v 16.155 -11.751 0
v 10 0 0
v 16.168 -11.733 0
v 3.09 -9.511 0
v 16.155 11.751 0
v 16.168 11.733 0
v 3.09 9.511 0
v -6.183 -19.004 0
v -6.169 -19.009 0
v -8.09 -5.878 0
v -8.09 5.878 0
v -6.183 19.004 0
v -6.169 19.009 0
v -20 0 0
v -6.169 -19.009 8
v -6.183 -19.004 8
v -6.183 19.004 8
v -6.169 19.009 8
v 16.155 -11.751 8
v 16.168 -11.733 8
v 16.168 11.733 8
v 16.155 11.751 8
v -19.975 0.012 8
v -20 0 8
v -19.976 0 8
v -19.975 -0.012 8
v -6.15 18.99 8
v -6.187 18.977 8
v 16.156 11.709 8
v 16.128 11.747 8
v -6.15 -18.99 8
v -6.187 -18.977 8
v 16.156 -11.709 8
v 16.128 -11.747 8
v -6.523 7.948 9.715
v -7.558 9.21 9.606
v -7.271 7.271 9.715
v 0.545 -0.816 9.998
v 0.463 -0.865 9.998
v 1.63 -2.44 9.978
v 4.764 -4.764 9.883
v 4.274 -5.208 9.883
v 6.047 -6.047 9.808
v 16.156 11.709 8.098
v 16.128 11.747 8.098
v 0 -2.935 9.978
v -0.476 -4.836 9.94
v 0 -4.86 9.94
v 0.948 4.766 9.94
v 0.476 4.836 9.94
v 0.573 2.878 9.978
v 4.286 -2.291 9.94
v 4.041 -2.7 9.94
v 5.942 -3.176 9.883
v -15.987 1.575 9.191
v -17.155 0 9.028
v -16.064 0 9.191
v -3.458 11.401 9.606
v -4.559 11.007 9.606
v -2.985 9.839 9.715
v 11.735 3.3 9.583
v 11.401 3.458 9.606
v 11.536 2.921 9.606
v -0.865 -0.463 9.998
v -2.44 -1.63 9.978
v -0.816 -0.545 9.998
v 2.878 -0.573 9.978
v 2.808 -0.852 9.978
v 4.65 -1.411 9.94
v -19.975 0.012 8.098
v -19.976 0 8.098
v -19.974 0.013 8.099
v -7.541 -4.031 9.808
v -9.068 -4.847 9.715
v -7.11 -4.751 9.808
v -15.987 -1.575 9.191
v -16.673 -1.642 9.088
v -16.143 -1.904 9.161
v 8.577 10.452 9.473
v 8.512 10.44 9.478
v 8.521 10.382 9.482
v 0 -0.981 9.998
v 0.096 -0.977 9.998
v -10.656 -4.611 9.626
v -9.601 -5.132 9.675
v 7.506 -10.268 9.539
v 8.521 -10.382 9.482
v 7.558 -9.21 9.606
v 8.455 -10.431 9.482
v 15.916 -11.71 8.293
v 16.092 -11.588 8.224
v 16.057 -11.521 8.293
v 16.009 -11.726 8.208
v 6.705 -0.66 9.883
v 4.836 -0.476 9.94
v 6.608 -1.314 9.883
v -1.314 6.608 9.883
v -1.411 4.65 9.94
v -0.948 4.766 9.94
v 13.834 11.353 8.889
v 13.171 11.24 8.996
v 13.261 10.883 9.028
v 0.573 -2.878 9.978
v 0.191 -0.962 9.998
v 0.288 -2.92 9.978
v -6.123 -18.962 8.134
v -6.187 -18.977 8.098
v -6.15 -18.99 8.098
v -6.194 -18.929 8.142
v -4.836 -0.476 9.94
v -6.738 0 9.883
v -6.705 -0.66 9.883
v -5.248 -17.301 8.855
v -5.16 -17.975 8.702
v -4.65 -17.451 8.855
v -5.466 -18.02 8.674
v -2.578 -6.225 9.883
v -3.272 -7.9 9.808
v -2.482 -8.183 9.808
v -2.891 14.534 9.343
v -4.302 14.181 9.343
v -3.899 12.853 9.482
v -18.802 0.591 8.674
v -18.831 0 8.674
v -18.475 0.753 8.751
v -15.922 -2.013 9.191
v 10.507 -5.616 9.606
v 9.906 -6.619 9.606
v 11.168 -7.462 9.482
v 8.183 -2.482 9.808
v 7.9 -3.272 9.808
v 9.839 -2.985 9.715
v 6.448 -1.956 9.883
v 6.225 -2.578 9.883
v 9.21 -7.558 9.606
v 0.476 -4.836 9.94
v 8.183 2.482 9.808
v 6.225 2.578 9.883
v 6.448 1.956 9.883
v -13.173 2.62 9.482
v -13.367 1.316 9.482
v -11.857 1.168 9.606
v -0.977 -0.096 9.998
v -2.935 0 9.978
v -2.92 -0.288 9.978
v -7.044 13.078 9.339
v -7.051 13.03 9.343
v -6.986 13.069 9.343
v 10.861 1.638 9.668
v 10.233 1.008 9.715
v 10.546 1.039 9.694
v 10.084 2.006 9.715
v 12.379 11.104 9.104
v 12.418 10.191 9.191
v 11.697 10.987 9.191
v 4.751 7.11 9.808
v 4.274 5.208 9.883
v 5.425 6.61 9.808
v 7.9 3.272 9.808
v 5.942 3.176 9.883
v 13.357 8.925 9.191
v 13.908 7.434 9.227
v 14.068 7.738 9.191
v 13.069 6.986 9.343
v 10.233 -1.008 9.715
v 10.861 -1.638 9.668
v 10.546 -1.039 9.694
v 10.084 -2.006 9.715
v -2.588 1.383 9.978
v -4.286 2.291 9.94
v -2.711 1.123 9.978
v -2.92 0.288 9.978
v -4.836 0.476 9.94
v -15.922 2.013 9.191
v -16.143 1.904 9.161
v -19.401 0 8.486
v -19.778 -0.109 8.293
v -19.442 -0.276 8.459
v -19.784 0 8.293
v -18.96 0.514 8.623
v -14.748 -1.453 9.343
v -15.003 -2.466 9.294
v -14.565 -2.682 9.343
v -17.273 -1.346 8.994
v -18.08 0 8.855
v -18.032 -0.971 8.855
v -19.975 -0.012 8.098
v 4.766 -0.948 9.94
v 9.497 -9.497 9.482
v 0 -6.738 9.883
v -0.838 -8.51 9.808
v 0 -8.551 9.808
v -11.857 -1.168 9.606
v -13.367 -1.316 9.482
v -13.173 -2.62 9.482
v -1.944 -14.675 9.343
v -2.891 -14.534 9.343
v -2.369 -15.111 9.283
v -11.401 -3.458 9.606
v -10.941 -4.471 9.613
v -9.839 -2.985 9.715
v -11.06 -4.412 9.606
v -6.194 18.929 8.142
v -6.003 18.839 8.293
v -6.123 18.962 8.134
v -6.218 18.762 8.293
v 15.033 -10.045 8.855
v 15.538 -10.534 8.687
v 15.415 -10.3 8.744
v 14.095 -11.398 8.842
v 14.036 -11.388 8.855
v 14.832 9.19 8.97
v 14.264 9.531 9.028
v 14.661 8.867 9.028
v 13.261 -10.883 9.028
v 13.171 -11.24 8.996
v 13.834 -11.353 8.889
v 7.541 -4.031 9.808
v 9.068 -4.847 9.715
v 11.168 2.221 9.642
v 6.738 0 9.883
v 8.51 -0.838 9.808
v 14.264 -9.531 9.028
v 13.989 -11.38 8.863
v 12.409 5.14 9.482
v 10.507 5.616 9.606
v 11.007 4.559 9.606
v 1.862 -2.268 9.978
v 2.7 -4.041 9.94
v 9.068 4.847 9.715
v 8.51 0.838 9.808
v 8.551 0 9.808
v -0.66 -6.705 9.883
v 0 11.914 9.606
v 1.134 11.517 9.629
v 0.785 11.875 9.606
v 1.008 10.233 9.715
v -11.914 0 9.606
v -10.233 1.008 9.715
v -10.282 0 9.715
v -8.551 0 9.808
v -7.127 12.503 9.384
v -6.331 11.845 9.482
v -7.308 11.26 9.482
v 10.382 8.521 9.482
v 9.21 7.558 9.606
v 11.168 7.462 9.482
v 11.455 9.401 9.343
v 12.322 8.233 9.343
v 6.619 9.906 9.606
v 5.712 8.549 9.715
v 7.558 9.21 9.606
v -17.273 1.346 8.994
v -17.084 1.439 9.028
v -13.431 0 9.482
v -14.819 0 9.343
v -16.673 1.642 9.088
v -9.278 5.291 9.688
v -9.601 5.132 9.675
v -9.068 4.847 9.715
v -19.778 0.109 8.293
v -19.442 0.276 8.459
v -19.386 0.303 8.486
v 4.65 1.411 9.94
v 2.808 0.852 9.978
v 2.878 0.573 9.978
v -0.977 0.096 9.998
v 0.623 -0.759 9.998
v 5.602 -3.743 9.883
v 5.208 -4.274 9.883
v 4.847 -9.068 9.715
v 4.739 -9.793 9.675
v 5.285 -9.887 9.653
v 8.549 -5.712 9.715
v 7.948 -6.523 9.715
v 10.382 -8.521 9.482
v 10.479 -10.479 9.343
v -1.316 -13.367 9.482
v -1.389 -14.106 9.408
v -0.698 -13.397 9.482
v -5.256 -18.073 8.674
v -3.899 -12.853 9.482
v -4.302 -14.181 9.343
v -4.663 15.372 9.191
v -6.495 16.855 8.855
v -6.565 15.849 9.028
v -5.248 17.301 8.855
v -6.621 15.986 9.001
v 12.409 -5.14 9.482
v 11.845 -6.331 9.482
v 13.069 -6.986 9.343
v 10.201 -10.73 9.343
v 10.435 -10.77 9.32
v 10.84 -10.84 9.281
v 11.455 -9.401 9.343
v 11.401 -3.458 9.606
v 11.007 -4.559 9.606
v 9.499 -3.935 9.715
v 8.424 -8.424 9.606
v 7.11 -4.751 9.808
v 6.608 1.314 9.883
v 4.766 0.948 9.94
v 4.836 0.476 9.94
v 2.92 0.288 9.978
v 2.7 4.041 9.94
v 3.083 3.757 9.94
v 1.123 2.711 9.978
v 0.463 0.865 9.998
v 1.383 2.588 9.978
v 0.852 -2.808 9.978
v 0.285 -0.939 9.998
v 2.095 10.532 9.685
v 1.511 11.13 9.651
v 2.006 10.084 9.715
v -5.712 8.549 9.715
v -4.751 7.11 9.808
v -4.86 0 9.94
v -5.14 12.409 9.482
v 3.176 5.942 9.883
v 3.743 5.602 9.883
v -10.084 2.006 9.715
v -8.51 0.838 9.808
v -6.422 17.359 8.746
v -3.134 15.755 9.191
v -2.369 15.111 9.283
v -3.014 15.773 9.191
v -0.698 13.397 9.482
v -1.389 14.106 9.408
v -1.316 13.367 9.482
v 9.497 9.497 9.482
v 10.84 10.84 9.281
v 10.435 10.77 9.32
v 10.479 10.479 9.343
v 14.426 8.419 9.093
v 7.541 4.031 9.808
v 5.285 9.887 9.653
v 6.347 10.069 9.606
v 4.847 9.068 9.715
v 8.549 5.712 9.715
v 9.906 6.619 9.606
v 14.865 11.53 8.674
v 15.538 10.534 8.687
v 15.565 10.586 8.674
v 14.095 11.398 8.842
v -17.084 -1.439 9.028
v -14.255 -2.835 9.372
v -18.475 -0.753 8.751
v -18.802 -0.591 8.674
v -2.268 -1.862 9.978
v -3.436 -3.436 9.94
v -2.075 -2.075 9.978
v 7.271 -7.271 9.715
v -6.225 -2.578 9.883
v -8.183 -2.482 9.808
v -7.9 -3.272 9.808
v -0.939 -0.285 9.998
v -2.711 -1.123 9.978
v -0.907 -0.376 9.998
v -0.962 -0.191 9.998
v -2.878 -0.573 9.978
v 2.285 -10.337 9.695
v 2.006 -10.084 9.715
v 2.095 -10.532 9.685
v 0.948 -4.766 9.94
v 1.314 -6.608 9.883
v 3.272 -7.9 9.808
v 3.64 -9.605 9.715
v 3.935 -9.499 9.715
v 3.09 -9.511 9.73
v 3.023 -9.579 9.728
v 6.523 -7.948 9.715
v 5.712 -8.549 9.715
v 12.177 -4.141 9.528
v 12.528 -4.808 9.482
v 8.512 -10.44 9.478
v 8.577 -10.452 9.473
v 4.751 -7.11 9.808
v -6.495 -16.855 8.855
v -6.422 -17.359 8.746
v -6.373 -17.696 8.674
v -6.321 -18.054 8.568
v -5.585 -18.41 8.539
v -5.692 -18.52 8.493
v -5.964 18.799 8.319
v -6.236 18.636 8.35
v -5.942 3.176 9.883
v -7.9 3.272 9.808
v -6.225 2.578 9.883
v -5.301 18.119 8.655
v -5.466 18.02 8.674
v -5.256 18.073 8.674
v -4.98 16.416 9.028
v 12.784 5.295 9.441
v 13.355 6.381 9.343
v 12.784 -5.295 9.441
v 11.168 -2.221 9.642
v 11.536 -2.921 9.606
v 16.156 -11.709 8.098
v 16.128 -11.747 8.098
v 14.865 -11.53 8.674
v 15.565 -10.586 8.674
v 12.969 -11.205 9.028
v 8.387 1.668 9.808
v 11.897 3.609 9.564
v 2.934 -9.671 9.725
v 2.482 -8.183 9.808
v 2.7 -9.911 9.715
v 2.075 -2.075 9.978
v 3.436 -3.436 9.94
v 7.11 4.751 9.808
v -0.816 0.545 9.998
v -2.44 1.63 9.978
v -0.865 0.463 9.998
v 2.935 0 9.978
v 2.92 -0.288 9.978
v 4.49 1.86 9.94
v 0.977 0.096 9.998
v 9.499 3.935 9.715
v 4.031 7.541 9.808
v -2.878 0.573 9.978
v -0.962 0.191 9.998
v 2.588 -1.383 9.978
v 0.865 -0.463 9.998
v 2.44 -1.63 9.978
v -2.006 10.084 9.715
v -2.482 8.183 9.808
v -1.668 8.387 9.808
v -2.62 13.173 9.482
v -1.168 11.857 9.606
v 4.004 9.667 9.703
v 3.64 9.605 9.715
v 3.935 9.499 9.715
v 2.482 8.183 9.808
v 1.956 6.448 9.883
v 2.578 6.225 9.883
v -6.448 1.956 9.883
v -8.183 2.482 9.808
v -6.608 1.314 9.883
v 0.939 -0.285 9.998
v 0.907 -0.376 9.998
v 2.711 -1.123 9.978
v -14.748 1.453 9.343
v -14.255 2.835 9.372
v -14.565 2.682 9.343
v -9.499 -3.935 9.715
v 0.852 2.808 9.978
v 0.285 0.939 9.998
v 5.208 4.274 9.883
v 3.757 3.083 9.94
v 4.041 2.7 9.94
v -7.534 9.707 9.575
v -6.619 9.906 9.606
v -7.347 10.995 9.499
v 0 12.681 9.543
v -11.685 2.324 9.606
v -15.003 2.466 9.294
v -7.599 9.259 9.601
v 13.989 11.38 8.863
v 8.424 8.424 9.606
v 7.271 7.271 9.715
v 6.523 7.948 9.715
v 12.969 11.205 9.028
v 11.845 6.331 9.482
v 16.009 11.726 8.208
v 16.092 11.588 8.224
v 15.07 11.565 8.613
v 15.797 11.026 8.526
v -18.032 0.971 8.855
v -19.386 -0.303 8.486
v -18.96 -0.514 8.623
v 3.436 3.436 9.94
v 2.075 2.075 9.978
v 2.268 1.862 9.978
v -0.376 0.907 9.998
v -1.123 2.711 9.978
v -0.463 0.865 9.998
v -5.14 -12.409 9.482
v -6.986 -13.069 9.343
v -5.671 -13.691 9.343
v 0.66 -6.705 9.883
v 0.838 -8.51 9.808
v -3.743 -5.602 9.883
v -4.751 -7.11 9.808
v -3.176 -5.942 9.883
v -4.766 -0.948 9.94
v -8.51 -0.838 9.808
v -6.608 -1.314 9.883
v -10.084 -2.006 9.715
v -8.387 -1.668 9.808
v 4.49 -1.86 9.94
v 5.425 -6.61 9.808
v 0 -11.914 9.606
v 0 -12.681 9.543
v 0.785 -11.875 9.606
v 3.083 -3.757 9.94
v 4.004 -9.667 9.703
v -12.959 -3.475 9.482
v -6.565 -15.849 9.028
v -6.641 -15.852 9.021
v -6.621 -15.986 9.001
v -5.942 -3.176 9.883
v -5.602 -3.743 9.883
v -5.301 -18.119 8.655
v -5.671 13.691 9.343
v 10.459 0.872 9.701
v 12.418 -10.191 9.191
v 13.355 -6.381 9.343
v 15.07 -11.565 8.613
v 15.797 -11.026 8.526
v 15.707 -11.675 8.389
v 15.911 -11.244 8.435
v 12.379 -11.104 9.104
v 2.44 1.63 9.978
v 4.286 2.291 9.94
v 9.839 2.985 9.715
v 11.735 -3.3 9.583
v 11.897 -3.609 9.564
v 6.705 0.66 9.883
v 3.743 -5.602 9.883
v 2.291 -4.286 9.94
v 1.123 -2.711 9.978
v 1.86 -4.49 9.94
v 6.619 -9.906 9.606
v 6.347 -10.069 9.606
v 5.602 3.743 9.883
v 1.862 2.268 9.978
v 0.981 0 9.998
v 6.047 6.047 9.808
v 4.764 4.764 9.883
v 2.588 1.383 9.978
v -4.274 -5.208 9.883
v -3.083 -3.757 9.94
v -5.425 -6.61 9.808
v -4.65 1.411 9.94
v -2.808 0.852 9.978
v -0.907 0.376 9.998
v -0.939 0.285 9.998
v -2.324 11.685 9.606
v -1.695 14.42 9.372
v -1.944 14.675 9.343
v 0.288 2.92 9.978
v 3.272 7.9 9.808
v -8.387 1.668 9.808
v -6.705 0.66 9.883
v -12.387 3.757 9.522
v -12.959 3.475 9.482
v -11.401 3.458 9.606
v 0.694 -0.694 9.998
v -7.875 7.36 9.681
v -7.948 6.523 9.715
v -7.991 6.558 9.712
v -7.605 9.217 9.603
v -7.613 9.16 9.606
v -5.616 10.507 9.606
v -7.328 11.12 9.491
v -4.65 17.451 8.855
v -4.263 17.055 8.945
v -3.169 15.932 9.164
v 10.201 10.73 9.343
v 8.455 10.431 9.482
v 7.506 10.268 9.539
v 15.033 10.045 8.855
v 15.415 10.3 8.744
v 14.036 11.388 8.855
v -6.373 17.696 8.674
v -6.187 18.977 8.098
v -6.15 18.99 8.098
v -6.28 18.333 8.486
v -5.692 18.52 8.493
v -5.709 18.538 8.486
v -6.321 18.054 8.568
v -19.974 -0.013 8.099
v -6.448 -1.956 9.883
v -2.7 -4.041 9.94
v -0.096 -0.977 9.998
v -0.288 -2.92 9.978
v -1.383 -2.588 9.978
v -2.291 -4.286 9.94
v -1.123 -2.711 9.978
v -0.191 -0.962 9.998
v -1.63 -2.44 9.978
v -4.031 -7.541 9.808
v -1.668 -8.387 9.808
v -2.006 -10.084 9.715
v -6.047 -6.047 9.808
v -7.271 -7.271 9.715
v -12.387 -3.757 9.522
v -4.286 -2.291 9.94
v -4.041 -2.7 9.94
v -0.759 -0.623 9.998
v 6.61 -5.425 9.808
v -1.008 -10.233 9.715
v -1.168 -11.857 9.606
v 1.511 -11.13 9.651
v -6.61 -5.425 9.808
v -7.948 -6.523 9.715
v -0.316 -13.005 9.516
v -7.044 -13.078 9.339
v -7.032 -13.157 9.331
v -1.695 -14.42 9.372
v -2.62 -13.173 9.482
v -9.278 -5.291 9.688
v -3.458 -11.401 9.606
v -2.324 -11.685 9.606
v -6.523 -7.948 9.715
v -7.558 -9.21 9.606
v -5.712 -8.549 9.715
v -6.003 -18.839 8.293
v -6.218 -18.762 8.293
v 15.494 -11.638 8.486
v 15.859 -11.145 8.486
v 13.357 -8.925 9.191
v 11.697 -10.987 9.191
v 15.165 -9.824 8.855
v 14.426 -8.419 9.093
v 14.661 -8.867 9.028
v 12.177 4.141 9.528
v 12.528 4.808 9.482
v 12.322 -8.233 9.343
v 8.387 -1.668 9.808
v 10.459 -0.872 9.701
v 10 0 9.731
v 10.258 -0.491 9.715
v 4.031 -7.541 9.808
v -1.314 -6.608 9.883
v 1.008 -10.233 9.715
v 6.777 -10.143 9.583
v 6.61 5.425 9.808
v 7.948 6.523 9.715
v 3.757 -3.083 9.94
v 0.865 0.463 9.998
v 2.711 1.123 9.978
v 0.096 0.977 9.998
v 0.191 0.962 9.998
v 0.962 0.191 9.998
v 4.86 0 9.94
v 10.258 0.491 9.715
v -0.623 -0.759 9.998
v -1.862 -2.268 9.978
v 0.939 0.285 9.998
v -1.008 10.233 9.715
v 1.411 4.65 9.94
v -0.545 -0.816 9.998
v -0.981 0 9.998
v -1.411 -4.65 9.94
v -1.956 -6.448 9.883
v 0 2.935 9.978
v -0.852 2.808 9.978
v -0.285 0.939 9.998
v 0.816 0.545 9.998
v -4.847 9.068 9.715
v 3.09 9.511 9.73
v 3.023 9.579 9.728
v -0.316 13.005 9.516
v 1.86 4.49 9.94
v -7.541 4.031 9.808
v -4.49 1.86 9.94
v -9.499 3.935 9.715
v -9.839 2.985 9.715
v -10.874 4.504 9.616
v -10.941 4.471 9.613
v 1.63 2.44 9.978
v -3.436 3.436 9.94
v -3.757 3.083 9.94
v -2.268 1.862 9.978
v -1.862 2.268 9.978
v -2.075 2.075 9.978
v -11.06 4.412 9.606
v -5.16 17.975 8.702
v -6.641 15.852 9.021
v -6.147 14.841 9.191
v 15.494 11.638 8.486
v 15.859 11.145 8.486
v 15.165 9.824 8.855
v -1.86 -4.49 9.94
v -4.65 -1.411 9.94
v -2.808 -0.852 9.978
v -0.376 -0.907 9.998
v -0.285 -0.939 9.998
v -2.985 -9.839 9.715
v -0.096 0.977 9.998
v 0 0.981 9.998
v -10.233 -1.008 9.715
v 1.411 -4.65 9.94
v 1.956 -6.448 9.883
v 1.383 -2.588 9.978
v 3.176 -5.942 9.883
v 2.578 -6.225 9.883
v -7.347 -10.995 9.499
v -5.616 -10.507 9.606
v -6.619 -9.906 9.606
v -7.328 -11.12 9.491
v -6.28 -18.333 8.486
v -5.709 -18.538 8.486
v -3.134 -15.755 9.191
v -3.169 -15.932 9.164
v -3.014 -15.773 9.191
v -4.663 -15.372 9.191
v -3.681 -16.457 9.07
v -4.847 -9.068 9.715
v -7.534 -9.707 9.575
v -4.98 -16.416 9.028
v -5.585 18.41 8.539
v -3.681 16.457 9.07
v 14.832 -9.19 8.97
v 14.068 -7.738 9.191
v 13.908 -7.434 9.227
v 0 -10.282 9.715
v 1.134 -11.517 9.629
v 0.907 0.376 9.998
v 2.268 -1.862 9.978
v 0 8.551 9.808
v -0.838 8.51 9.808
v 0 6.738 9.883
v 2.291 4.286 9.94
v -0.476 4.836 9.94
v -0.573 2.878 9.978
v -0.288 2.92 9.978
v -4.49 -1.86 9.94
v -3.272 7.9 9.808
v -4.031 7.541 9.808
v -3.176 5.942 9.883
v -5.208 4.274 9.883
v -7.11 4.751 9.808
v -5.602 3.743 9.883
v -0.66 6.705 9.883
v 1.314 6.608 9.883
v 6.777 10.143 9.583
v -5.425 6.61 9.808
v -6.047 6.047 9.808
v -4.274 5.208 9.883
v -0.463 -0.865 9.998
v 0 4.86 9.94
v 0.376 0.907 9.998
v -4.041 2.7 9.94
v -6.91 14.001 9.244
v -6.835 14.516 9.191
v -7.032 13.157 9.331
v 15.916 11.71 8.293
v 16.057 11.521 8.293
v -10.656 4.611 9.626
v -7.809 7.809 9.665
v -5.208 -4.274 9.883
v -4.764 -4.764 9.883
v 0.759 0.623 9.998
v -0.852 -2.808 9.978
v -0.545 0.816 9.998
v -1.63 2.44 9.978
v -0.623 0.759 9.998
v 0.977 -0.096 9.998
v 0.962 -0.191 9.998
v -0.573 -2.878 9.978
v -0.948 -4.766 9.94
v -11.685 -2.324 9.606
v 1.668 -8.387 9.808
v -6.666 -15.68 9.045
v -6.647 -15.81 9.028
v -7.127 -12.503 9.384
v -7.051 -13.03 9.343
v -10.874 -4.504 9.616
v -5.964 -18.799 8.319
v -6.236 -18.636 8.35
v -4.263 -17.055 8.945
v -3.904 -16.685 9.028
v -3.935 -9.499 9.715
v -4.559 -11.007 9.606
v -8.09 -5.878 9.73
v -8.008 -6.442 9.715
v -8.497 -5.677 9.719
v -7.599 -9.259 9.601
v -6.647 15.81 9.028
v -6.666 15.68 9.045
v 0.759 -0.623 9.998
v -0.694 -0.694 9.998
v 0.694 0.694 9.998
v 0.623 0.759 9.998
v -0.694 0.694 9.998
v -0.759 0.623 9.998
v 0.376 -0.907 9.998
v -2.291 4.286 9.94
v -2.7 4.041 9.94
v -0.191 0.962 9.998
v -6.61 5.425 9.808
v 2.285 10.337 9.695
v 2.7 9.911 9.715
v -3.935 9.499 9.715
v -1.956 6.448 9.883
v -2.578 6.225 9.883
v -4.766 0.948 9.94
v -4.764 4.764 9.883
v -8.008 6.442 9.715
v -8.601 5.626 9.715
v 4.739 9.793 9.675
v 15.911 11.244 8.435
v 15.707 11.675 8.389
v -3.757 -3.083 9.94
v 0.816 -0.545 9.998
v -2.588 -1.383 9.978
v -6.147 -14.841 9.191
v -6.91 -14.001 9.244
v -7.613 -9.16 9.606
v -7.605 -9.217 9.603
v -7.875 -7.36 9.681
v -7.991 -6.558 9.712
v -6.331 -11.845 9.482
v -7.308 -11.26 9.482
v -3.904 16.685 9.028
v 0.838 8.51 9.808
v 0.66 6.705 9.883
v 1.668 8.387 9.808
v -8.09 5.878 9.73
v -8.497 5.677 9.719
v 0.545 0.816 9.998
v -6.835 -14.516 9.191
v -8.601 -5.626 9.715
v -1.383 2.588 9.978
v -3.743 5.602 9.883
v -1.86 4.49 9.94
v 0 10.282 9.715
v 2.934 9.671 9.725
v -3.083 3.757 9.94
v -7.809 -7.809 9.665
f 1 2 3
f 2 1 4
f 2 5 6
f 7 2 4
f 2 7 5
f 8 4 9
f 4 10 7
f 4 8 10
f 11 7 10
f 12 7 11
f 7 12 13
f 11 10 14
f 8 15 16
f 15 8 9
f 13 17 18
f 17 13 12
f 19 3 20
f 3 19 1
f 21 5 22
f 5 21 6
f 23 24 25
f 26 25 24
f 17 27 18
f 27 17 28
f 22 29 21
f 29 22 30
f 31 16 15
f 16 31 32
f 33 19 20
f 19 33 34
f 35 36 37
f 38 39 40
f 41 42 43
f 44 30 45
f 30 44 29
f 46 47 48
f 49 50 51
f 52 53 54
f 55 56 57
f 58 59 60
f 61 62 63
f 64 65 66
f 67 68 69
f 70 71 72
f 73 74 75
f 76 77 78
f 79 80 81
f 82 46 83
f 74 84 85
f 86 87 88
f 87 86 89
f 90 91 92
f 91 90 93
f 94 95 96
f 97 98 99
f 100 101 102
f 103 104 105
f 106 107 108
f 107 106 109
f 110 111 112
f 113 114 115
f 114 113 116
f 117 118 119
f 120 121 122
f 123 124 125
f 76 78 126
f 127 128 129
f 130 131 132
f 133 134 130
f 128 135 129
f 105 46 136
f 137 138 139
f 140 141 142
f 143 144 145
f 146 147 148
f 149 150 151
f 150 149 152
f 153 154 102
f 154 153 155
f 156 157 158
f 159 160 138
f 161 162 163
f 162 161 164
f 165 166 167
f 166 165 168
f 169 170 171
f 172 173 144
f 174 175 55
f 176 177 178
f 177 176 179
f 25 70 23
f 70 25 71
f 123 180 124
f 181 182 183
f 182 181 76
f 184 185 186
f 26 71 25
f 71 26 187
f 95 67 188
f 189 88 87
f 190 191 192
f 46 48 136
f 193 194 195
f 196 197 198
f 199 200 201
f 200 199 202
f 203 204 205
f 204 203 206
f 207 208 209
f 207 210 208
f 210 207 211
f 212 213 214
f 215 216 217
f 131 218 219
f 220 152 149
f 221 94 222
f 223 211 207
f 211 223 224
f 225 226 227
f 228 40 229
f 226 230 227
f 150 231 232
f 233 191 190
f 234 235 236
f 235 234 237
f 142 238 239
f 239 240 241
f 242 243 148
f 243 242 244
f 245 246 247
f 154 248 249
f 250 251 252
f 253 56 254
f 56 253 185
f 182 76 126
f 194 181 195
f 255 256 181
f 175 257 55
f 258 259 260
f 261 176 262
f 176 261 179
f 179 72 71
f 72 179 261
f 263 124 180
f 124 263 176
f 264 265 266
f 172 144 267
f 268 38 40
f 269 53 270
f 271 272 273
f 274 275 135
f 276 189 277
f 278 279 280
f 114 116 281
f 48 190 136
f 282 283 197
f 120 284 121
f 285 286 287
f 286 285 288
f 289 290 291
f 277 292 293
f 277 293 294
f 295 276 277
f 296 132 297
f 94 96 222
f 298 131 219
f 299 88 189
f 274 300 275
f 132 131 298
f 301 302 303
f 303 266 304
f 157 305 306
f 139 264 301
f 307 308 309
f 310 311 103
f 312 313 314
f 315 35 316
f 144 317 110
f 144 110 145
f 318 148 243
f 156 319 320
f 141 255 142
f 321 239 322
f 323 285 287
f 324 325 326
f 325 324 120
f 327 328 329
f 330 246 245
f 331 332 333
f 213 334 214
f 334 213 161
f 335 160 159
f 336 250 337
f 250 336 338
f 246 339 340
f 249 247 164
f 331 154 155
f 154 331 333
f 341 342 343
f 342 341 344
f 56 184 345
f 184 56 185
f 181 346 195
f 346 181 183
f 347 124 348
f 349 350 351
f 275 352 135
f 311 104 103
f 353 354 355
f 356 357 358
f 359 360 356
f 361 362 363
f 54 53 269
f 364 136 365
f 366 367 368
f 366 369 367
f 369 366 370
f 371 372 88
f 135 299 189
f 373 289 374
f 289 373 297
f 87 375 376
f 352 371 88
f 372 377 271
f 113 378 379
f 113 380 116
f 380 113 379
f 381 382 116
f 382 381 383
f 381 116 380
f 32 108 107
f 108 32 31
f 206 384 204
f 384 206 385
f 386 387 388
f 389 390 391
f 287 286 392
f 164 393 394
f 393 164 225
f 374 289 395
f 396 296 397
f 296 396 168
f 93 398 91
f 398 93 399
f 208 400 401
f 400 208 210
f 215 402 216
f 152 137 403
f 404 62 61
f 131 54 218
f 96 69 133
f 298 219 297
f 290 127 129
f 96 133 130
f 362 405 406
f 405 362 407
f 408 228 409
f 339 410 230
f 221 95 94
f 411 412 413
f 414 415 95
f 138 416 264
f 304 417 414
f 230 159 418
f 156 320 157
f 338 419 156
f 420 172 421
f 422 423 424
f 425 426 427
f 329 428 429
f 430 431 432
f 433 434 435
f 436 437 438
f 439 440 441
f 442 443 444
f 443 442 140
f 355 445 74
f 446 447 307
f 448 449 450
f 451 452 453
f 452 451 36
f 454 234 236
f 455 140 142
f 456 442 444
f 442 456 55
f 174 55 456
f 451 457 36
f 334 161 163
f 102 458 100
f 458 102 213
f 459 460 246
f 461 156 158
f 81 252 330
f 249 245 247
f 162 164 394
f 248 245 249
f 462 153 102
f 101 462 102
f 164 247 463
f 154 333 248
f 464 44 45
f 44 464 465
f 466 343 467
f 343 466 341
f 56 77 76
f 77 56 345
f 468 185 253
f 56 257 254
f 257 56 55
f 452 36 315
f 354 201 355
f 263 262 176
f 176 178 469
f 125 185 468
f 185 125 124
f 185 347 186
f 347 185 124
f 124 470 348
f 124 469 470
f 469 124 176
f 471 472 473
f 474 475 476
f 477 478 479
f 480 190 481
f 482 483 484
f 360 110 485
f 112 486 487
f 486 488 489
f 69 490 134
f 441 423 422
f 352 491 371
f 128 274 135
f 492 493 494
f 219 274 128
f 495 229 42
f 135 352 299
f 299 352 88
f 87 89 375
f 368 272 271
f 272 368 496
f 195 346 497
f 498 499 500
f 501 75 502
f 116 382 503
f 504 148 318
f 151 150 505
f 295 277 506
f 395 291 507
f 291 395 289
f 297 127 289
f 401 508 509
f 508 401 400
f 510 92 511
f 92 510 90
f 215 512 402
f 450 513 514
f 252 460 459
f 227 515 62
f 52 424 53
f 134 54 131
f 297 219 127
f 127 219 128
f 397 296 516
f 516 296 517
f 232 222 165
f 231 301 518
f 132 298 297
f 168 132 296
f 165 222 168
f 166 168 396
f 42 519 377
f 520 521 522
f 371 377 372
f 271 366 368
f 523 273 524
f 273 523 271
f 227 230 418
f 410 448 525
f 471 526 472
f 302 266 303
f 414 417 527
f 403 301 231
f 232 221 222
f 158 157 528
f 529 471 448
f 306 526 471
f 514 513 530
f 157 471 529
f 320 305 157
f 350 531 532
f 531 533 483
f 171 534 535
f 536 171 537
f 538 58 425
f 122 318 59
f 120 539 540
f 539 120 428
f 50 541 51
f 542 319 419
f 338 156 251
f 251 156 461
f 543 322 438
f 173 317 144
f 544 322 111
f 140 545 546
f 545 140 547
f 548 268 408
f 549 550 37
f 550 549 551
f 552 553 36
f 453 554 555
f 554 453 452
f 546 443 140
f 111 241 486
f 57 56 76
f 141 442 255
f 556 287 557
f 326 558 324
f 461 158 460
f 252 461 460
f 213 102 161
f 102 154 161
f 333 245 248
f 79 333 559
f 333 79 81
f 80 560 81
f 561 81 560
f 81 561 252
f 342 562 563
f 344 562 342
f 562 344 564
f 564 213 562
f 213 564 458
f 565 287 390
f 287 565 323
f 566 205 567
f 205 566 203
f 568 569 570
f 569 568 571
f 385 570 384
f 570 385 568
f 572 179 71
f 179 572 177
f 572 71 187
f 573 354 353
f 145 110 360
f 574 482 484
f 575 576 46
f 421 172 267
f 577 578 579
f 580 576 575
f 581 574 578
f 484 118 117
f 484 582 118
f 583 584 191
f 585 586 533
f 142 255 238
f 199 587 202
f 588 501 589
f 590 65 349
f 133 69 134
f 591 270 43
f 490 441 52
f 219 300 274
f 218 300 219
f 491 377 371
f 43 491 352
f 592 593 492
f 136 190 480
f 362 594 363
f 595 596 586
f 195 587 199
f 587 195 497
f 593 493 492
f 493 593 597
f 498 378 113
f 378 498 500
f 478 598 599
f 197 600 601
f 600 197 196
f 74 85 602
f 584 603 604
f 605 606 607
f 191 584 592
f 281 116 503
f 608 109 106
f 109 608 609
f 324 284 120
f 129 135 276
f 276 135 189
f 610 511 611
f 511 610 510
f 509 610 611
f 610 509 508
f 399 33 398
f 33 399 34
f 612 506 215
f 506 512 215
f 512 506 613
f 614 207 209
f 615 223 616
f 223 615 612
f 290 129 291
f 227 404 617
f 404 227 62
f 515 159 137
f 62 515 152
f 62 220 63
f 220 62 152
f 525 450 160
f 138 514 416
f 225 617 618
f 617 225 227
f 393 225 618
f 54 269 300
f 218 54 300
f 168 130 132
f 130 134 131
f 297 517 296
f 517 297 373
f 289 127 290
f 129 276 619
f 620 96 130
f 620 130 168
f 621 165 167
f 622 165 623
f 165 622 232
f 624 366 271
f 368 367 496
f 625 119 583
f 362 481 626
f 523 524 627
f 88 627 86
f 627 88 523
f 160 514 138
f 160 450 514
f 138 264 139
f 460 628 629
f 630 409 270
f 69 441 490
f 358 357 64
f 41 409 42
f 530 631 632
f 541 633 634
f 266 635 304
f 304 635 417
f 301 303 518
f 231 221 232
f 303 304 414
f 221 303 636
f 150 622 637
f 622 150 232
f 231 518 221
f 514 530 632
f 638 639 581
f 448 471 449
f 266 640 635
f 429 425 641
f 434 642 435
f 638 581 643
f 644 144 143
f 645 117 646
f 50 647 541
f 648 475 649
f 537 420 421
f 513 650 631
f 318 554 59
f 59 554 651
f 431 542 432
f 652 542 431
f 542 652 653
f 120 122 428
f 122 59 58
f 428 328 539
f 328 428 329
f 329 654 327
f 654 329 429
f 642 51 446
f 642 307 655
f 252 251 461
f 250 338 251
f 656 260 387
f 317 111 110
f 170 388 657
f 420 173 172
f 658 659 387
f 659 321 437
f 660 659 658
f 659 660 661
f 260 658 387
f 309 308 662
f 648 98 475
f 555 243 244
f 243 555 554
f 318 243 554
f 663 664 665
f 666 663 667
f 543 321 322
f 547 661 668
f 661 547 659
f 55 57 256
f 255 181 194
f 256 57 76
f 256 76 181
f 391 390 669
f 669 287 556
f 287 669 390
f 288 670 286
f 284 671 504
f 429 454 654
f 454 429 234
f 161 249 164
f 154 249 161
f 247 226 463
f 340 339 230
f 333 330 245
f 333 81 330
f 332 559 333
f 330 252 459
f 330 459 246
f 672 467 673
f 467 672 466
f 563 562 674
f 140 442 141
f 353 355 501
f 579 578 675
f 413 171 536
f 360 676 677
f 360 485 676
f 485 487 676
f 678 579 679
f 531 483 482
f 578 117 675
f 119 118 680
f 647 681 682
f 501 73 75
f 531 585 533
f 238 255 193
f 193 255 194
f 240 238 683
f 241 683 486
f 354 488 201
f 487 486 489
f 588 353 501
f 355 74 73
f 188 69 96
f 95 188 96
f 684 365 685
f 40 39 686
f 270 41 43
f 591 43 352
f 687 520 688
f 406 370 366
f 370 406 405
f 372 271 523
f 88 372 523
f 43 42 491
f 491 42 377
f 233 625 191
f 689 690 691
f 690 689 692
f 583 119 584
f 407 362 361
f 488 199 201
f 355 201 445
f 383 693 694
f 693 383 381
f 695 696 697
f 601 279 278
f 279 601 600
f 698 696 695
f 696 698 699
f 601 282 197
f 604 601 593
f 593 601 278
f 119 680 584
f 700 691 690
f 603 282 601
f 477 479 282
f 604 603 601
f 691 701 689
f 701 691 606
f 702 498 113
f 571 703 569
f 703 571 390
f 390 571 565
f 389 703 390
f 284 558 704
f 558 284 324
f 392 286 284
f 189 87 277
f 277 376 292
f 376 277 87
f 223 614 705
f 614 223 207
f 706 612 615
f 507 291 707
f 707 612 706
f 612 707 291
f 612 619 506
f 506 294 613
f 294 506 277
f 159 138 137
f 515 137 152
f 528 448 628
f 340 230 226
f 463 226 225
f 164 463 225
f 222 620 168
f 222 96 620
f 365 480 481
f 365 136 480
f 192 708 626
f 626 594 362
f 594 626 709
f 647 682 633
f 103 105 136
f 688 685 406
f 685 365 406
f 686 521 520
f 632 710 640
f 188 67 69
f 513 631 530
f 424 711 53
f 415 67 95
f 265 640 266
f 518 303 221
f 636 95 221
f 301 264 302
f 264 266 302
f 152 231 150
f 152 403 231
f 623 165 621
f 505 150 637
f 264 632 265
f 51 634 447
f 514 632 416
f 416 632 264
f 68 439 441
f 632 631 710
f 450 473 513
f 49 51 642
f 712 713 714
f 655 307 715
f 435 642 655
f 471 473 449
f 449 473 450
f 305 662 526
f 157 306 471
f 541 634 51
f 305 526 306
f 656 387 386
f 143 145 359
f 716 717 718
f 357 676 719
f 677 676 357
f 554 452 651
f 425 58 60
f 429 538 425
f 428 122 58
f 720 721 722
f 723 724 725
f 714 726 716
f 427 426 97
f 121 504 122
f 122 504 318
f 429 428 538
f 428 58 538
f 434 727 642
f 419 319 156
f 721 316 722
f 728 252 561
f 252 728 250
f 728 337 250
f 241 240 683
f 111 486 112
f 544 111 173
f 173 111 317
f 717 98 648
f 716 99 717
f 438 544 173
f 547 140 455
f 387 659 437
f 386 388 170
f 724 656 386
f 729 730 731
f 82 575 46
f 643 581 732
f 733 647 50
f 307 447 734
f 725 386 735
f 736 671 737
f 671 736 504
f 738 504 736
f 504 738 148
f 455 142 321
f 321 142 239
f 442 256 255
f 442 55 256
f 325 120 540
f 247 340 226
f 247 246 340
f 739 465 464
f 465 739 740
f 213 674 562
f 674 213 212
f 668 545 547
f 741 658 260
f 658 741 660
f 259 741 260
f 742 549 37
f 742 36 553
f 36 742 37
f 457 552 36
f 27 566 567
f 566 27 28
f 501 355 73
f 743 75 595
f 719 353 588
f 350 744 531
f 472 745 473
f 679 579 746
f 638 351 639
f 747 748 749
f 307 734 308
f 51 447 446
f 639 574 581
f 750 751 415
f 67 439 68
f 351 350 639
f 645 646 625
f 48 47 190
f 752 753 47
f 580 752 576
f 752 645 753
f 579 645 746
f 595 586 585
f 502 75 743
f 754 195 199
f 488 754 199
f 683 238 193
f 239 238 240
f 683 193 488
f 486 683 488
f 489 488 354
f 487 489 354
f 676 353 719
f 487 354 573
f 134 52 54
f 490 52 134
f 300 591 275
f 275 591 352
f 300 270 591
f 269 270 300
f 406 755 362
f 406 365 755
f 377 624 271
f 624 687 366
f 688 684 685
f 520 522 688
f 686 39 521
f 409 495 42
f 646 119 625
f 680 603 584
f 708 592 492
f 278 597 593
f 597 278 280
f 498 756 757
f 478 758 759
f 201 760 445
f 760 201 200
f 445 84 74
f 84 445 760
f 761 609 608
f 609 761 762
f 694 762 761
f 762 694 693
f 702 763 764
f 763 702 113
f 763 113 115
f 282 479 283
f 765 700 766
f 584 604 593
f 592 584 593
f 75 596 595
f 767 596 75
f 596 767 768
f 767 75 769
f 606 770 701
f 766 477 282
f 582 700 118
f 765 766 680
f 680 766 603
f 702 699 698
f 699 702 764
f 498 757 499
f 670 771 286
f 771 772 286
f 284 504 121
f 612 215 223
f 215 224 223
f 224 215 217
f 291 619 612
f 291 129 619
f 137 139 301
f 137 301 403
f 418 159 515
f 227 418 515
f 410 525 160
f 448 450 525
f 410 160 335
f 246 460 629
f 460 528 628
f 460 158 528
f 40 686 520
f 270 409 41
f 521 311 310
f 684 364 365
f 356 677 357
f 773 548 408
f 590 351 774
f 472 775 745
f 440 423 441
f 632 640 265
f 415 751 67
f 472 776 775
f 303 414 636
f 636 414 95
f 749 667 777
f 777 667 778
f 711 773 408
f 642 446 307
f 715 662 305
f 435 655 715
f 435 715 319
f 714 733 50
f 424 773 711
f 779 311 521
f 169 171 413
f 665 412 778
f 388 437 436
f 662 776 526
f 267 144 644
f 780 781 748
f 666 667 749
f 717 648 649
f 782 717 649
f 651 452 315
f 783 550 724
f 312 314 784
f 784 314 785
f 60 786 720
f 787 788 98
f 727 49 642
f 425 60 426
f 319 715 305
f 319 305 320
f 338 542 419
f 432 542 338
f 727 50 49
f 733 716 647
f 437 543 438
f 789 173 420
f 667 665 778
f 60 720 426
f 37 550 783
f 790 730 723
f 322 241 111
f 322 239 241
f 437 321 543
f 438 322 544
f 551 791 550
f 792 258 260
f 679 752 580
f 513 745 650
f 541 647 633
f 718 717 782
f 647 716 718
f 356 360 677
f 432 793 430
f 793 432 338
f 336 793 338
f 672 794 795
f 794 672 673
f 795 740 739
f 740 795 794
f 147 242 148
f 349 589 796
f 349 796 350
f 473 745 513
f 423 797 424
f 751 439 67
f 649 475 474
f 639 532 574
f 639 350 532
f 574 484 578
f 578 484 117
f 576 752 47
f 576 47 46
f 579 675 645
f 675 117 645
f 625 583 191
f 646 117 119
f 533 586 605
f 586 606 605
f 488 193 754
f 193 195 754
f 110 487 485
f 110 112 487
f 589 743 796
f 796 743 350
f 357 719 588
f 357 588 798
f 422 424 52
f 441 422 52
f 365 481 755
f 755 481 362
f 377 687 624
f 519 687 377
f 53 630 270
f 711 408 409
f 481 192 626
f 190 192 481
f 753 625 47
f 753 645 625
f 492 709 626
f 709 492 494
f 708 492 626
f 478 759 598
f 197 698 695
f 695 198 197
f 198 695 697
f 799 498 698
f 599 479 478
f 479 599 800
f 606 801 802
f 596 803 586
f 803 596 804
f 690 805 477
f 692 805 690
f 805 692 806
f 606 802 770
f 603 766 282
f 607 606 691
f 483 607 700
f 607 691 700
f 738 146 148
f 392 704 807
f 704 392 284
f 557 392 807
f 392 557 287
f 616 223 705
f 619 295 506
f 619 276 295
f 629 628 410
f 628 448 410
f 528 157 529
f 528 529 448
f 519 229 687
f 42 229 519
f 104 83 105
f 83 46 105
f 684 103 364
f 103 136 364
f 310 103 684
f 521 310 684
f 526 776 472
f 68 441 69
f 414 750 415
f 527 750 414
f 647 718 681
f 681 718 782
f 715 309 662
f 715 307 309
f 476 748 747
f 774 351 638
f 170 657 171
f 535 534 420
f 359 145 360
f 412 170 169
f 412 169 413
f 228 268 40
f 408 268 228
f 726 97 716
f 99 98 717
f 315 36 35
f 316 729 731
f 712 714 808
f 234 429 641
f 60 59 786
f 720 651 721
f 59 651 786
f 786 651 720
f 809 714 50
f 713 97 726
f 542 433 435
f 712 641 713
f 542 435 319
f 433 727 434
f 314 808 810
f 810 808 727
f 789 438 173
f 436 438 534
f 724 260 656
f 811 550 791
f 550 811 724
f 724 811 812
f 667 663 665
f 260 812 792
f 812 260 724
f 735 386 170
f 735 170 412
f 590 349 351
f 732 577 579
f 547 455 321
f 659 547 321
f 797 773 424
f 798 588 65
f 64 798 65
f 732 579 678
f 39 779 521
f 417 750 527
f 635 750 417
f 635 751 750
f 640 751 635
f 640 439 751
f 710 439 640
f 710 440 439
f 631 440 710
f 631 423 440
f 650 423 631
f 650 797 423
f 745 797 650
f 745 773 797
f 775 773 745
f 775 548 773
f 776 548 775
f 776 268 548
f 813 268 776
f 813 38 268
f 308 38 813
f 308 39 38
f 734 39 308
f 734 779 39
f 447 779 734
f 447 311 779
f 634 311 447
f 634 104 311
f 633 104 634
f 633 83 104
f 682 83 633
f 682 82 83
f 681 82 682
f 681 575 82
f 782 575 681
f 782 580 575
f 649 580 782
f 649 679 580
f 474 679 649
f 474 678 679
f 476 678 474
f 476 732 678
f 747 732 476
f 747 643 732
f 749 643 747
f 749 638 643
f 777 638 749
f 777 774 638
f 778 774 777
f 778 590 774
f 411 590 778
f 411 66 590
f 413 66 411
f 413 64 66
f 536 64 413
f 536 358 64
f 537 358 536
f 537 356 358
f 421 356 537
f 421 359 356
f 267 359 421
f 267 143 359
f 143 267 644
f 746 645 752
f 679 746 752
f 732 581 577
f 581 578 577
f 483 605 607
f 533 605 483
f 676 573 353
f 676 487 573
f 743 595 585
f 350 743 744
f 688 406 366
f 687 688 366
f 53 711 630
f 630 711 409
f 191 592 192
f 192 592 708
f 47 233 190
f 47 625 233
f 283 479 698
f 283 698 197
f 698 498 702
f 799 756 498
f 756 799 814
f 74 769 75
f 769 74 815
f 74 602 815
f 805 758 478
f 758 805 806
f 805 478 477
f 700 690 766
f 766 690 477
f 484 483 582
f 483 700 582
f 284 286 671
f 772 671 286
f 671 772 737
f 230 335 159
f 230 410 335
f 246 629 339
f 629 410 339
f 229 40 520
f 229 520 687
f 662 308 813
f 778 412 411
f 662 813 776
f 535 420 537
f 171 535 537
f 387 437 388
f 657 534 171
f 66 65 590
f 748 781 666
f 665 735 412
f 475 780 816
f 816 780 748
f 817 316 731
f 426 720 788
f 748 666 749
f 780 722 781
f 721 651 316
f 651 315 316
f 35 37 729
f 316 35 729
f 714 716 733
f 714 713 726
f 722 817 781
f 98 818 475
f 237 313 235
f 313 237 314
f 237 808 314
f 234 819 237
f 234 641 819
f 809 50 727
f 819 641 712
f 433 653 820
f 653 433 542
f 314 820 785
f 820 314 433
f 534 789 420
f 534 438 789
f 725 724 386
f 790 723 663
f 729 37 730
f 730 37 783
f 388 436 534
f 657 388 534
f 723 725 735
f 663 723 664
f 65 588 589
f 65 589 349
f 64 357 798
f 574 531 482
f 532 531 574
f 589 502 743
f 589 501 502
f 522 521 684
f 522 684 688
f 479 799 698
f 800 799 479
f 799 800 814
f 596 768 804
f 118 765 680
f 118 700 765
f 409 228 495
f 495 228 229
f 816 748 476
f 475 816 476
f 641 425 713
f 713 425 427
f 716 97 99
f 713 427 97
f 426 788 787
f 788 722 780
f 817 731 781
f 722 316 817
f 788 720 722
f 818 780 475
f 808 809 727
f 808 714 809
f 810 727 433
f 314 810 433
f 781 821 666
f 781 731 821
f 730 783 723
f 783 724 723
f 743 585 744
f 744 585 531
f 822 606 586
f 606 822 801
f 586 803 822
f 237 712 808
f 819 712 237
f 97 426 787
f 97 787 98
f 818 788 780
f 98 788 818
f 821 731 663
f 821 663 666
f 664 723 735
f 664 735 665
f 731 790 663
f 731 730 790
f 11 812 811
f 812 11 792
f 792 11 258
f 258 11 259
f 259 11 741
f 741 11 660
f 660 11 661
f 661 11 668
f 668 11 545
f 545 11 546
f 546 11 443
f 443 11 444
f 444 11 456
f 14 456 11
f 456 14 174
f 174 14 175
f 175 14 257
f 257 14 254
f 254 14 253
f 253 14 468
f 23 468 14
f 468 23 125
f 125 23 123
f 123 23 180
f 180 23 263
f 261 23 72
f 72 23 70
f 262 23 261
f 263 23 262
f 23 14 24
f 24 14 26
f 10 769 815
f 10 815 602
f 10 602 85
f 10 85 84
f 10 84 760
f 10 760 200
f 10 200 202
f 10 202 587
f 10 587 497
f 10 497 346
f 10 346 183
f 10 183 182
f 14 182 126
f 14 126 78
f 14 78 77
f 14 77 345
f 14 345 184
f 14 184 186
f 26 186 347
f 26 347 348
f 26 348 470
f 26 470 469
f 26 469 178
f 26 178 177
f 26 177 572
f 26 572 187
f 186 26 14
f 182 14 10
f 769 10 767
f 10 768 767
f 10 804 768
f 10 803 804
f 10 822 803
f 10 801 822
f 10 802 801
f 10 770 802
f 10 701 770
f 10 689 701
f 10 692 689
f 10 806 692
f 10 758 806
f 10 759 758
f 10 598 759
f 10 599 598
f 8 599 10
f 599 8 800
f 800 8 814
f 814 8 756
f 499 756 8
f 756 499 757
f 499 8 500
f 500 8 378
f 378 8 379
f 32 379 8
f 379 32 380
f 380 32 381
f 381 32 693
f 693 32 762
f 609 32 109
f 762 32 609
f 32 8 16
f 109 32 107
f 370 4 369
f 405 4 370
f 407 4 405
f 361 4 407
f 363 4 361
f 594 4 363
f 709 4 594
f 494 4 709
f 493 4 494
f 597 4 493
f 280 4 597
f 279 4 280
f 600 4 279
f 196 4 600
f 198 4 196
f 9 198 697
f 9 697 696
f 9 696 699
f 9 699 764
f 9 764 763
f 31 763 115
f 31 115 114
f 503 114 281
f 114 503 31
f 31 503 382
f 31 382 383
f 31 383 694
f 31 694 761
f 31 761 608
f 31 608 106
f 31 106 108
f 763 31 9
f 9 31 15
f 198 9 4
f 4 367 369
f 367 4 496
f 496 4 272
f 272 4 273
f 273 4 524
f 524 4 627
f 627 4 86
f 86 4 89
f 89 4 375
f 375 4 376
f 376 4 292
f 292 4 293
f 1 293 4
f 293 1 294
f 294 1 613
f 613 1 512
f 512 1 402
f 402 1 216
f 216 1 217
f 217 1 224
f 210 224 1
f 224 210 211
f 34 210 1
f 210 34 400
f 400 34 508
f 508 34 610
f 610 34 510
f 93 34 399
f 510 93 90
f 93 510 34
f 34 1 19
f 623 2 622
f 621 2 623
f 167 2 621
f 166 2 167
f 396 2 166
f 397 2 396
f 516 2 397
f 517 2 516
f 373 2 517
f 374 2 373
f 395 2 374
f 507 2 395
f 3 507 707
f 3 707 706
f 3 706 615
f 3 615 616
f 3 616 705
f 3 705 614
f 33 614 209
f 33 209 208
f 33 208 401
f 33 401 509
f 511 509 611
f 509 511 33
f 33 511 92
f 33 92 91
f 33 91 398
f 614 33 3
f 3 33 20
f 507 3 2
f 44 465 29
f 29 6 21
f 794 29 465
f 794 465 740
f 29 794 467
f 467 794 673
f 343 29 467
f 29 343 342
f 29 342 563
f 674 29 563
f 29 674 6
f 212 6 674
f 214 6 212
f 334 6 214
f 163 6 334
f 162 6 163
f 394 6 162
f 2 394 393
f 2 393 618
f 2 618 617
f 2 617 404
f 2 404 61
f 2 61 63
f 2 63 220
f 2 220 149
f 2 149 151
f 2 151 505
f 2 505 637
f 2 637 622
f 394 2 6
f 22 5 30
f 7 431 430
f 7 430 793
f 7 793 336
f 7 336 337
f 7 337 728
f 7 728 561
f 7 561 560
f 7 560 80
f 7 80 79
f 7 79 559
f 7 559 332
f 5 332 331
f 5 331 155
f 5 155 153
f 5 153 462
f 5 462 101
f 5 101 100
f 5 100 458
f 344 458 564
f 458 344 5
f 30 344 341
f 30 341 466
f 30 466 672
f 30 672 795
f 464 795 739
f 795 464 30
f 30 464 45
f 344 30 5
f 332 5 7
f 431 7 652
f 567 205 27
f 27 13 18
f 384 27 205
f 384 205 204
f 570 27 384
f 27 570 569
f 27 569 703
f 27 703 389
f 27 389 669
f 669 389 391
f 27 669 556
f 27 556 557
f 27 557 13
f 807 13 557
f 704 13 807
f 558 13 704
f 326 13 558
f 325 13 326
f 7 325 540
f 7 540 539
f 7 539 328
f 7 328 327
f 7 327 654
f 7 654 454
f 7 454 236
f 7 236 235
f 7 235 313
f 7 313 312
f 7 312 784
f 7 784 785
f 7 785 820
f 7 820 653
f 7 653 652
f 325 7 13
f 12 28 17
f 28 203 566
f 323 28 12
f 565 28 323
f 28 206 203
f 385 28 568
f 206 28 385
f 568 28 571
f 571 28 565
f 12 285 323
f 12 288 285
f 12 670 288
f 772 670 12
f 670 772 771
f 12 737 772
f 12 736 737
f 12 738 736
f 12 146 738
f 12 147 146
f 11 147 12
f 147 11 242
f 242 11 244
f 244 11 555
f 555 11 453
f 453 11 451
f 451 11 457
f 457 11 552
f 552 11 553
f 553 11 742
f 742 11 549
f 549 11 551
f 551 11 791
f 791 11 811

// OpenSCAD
//How Much cornser should your star have?
corners=5; //[3:1:32]

// What should the raduis of the stars 'body' be?
ri=10; //[0:0.1:500]

// What should the radius of the stars tips be?
ro=20; //[0:0.1:500]

// How high shoild your star be?
h=10;  //[0:0.1:500]

// How much of the stars height should be rounded?
roundness=.2; //[0:0.01:1]

// Would you like to get a mold or the star?
// Use to preview the positive.
mold="no"; //[no,yes]

// How thick should the mold be (relative to the star it self)?
mold_padding=0.1; //[0.05:0.05:1]

// $fn, how detailed should the rounding be?
fn=64; //[16:1:256]

$fn=fn;



module Star(points, outer, inner) {
	function x(r, a) = r * cos(a);
	function y(r, a) = r * sin(a);
	increment = 360/points;
	union() {
		for (p = [0 : points-1]) {
			assign(	x_outer = x(outer, increment * p),
					y_outer = y(outer, increment * p),
					x_inner = x(inner, (increment * p) + (increment/2)),
					y_inner = y(inner, (increment * p) + (increment/2)),
					x_next  = x(outer, increment * (p+1)),
					y_next  = y(outer, increment * (p+1))) {
				polygon(points = [[x_outer, y_outer], [x_inner, y_inner], [x_next, y_next], [0, 0]], paths  = [[0, 1, 2, 3]]);
			}
		}
	}
}


module star(){
  render()intersection(){
    linear_extrude(h)Star(corners,ri,ro);
    union(){
      cylinder(r=ro,h=h*(1-roundness));
      translate([0,0,h*(1-roundness)])scale([ro,ro,h*roundness])sphere(r=1);
    }
  }
}

if(mold=="yes"){
    render()rotate([180,0,0])difference(){
      scale([1+mold_padding,1+mold_padding,1+mold_padding])star(roundness=0);
      star();
    }    
  
}else{
  star();
}
